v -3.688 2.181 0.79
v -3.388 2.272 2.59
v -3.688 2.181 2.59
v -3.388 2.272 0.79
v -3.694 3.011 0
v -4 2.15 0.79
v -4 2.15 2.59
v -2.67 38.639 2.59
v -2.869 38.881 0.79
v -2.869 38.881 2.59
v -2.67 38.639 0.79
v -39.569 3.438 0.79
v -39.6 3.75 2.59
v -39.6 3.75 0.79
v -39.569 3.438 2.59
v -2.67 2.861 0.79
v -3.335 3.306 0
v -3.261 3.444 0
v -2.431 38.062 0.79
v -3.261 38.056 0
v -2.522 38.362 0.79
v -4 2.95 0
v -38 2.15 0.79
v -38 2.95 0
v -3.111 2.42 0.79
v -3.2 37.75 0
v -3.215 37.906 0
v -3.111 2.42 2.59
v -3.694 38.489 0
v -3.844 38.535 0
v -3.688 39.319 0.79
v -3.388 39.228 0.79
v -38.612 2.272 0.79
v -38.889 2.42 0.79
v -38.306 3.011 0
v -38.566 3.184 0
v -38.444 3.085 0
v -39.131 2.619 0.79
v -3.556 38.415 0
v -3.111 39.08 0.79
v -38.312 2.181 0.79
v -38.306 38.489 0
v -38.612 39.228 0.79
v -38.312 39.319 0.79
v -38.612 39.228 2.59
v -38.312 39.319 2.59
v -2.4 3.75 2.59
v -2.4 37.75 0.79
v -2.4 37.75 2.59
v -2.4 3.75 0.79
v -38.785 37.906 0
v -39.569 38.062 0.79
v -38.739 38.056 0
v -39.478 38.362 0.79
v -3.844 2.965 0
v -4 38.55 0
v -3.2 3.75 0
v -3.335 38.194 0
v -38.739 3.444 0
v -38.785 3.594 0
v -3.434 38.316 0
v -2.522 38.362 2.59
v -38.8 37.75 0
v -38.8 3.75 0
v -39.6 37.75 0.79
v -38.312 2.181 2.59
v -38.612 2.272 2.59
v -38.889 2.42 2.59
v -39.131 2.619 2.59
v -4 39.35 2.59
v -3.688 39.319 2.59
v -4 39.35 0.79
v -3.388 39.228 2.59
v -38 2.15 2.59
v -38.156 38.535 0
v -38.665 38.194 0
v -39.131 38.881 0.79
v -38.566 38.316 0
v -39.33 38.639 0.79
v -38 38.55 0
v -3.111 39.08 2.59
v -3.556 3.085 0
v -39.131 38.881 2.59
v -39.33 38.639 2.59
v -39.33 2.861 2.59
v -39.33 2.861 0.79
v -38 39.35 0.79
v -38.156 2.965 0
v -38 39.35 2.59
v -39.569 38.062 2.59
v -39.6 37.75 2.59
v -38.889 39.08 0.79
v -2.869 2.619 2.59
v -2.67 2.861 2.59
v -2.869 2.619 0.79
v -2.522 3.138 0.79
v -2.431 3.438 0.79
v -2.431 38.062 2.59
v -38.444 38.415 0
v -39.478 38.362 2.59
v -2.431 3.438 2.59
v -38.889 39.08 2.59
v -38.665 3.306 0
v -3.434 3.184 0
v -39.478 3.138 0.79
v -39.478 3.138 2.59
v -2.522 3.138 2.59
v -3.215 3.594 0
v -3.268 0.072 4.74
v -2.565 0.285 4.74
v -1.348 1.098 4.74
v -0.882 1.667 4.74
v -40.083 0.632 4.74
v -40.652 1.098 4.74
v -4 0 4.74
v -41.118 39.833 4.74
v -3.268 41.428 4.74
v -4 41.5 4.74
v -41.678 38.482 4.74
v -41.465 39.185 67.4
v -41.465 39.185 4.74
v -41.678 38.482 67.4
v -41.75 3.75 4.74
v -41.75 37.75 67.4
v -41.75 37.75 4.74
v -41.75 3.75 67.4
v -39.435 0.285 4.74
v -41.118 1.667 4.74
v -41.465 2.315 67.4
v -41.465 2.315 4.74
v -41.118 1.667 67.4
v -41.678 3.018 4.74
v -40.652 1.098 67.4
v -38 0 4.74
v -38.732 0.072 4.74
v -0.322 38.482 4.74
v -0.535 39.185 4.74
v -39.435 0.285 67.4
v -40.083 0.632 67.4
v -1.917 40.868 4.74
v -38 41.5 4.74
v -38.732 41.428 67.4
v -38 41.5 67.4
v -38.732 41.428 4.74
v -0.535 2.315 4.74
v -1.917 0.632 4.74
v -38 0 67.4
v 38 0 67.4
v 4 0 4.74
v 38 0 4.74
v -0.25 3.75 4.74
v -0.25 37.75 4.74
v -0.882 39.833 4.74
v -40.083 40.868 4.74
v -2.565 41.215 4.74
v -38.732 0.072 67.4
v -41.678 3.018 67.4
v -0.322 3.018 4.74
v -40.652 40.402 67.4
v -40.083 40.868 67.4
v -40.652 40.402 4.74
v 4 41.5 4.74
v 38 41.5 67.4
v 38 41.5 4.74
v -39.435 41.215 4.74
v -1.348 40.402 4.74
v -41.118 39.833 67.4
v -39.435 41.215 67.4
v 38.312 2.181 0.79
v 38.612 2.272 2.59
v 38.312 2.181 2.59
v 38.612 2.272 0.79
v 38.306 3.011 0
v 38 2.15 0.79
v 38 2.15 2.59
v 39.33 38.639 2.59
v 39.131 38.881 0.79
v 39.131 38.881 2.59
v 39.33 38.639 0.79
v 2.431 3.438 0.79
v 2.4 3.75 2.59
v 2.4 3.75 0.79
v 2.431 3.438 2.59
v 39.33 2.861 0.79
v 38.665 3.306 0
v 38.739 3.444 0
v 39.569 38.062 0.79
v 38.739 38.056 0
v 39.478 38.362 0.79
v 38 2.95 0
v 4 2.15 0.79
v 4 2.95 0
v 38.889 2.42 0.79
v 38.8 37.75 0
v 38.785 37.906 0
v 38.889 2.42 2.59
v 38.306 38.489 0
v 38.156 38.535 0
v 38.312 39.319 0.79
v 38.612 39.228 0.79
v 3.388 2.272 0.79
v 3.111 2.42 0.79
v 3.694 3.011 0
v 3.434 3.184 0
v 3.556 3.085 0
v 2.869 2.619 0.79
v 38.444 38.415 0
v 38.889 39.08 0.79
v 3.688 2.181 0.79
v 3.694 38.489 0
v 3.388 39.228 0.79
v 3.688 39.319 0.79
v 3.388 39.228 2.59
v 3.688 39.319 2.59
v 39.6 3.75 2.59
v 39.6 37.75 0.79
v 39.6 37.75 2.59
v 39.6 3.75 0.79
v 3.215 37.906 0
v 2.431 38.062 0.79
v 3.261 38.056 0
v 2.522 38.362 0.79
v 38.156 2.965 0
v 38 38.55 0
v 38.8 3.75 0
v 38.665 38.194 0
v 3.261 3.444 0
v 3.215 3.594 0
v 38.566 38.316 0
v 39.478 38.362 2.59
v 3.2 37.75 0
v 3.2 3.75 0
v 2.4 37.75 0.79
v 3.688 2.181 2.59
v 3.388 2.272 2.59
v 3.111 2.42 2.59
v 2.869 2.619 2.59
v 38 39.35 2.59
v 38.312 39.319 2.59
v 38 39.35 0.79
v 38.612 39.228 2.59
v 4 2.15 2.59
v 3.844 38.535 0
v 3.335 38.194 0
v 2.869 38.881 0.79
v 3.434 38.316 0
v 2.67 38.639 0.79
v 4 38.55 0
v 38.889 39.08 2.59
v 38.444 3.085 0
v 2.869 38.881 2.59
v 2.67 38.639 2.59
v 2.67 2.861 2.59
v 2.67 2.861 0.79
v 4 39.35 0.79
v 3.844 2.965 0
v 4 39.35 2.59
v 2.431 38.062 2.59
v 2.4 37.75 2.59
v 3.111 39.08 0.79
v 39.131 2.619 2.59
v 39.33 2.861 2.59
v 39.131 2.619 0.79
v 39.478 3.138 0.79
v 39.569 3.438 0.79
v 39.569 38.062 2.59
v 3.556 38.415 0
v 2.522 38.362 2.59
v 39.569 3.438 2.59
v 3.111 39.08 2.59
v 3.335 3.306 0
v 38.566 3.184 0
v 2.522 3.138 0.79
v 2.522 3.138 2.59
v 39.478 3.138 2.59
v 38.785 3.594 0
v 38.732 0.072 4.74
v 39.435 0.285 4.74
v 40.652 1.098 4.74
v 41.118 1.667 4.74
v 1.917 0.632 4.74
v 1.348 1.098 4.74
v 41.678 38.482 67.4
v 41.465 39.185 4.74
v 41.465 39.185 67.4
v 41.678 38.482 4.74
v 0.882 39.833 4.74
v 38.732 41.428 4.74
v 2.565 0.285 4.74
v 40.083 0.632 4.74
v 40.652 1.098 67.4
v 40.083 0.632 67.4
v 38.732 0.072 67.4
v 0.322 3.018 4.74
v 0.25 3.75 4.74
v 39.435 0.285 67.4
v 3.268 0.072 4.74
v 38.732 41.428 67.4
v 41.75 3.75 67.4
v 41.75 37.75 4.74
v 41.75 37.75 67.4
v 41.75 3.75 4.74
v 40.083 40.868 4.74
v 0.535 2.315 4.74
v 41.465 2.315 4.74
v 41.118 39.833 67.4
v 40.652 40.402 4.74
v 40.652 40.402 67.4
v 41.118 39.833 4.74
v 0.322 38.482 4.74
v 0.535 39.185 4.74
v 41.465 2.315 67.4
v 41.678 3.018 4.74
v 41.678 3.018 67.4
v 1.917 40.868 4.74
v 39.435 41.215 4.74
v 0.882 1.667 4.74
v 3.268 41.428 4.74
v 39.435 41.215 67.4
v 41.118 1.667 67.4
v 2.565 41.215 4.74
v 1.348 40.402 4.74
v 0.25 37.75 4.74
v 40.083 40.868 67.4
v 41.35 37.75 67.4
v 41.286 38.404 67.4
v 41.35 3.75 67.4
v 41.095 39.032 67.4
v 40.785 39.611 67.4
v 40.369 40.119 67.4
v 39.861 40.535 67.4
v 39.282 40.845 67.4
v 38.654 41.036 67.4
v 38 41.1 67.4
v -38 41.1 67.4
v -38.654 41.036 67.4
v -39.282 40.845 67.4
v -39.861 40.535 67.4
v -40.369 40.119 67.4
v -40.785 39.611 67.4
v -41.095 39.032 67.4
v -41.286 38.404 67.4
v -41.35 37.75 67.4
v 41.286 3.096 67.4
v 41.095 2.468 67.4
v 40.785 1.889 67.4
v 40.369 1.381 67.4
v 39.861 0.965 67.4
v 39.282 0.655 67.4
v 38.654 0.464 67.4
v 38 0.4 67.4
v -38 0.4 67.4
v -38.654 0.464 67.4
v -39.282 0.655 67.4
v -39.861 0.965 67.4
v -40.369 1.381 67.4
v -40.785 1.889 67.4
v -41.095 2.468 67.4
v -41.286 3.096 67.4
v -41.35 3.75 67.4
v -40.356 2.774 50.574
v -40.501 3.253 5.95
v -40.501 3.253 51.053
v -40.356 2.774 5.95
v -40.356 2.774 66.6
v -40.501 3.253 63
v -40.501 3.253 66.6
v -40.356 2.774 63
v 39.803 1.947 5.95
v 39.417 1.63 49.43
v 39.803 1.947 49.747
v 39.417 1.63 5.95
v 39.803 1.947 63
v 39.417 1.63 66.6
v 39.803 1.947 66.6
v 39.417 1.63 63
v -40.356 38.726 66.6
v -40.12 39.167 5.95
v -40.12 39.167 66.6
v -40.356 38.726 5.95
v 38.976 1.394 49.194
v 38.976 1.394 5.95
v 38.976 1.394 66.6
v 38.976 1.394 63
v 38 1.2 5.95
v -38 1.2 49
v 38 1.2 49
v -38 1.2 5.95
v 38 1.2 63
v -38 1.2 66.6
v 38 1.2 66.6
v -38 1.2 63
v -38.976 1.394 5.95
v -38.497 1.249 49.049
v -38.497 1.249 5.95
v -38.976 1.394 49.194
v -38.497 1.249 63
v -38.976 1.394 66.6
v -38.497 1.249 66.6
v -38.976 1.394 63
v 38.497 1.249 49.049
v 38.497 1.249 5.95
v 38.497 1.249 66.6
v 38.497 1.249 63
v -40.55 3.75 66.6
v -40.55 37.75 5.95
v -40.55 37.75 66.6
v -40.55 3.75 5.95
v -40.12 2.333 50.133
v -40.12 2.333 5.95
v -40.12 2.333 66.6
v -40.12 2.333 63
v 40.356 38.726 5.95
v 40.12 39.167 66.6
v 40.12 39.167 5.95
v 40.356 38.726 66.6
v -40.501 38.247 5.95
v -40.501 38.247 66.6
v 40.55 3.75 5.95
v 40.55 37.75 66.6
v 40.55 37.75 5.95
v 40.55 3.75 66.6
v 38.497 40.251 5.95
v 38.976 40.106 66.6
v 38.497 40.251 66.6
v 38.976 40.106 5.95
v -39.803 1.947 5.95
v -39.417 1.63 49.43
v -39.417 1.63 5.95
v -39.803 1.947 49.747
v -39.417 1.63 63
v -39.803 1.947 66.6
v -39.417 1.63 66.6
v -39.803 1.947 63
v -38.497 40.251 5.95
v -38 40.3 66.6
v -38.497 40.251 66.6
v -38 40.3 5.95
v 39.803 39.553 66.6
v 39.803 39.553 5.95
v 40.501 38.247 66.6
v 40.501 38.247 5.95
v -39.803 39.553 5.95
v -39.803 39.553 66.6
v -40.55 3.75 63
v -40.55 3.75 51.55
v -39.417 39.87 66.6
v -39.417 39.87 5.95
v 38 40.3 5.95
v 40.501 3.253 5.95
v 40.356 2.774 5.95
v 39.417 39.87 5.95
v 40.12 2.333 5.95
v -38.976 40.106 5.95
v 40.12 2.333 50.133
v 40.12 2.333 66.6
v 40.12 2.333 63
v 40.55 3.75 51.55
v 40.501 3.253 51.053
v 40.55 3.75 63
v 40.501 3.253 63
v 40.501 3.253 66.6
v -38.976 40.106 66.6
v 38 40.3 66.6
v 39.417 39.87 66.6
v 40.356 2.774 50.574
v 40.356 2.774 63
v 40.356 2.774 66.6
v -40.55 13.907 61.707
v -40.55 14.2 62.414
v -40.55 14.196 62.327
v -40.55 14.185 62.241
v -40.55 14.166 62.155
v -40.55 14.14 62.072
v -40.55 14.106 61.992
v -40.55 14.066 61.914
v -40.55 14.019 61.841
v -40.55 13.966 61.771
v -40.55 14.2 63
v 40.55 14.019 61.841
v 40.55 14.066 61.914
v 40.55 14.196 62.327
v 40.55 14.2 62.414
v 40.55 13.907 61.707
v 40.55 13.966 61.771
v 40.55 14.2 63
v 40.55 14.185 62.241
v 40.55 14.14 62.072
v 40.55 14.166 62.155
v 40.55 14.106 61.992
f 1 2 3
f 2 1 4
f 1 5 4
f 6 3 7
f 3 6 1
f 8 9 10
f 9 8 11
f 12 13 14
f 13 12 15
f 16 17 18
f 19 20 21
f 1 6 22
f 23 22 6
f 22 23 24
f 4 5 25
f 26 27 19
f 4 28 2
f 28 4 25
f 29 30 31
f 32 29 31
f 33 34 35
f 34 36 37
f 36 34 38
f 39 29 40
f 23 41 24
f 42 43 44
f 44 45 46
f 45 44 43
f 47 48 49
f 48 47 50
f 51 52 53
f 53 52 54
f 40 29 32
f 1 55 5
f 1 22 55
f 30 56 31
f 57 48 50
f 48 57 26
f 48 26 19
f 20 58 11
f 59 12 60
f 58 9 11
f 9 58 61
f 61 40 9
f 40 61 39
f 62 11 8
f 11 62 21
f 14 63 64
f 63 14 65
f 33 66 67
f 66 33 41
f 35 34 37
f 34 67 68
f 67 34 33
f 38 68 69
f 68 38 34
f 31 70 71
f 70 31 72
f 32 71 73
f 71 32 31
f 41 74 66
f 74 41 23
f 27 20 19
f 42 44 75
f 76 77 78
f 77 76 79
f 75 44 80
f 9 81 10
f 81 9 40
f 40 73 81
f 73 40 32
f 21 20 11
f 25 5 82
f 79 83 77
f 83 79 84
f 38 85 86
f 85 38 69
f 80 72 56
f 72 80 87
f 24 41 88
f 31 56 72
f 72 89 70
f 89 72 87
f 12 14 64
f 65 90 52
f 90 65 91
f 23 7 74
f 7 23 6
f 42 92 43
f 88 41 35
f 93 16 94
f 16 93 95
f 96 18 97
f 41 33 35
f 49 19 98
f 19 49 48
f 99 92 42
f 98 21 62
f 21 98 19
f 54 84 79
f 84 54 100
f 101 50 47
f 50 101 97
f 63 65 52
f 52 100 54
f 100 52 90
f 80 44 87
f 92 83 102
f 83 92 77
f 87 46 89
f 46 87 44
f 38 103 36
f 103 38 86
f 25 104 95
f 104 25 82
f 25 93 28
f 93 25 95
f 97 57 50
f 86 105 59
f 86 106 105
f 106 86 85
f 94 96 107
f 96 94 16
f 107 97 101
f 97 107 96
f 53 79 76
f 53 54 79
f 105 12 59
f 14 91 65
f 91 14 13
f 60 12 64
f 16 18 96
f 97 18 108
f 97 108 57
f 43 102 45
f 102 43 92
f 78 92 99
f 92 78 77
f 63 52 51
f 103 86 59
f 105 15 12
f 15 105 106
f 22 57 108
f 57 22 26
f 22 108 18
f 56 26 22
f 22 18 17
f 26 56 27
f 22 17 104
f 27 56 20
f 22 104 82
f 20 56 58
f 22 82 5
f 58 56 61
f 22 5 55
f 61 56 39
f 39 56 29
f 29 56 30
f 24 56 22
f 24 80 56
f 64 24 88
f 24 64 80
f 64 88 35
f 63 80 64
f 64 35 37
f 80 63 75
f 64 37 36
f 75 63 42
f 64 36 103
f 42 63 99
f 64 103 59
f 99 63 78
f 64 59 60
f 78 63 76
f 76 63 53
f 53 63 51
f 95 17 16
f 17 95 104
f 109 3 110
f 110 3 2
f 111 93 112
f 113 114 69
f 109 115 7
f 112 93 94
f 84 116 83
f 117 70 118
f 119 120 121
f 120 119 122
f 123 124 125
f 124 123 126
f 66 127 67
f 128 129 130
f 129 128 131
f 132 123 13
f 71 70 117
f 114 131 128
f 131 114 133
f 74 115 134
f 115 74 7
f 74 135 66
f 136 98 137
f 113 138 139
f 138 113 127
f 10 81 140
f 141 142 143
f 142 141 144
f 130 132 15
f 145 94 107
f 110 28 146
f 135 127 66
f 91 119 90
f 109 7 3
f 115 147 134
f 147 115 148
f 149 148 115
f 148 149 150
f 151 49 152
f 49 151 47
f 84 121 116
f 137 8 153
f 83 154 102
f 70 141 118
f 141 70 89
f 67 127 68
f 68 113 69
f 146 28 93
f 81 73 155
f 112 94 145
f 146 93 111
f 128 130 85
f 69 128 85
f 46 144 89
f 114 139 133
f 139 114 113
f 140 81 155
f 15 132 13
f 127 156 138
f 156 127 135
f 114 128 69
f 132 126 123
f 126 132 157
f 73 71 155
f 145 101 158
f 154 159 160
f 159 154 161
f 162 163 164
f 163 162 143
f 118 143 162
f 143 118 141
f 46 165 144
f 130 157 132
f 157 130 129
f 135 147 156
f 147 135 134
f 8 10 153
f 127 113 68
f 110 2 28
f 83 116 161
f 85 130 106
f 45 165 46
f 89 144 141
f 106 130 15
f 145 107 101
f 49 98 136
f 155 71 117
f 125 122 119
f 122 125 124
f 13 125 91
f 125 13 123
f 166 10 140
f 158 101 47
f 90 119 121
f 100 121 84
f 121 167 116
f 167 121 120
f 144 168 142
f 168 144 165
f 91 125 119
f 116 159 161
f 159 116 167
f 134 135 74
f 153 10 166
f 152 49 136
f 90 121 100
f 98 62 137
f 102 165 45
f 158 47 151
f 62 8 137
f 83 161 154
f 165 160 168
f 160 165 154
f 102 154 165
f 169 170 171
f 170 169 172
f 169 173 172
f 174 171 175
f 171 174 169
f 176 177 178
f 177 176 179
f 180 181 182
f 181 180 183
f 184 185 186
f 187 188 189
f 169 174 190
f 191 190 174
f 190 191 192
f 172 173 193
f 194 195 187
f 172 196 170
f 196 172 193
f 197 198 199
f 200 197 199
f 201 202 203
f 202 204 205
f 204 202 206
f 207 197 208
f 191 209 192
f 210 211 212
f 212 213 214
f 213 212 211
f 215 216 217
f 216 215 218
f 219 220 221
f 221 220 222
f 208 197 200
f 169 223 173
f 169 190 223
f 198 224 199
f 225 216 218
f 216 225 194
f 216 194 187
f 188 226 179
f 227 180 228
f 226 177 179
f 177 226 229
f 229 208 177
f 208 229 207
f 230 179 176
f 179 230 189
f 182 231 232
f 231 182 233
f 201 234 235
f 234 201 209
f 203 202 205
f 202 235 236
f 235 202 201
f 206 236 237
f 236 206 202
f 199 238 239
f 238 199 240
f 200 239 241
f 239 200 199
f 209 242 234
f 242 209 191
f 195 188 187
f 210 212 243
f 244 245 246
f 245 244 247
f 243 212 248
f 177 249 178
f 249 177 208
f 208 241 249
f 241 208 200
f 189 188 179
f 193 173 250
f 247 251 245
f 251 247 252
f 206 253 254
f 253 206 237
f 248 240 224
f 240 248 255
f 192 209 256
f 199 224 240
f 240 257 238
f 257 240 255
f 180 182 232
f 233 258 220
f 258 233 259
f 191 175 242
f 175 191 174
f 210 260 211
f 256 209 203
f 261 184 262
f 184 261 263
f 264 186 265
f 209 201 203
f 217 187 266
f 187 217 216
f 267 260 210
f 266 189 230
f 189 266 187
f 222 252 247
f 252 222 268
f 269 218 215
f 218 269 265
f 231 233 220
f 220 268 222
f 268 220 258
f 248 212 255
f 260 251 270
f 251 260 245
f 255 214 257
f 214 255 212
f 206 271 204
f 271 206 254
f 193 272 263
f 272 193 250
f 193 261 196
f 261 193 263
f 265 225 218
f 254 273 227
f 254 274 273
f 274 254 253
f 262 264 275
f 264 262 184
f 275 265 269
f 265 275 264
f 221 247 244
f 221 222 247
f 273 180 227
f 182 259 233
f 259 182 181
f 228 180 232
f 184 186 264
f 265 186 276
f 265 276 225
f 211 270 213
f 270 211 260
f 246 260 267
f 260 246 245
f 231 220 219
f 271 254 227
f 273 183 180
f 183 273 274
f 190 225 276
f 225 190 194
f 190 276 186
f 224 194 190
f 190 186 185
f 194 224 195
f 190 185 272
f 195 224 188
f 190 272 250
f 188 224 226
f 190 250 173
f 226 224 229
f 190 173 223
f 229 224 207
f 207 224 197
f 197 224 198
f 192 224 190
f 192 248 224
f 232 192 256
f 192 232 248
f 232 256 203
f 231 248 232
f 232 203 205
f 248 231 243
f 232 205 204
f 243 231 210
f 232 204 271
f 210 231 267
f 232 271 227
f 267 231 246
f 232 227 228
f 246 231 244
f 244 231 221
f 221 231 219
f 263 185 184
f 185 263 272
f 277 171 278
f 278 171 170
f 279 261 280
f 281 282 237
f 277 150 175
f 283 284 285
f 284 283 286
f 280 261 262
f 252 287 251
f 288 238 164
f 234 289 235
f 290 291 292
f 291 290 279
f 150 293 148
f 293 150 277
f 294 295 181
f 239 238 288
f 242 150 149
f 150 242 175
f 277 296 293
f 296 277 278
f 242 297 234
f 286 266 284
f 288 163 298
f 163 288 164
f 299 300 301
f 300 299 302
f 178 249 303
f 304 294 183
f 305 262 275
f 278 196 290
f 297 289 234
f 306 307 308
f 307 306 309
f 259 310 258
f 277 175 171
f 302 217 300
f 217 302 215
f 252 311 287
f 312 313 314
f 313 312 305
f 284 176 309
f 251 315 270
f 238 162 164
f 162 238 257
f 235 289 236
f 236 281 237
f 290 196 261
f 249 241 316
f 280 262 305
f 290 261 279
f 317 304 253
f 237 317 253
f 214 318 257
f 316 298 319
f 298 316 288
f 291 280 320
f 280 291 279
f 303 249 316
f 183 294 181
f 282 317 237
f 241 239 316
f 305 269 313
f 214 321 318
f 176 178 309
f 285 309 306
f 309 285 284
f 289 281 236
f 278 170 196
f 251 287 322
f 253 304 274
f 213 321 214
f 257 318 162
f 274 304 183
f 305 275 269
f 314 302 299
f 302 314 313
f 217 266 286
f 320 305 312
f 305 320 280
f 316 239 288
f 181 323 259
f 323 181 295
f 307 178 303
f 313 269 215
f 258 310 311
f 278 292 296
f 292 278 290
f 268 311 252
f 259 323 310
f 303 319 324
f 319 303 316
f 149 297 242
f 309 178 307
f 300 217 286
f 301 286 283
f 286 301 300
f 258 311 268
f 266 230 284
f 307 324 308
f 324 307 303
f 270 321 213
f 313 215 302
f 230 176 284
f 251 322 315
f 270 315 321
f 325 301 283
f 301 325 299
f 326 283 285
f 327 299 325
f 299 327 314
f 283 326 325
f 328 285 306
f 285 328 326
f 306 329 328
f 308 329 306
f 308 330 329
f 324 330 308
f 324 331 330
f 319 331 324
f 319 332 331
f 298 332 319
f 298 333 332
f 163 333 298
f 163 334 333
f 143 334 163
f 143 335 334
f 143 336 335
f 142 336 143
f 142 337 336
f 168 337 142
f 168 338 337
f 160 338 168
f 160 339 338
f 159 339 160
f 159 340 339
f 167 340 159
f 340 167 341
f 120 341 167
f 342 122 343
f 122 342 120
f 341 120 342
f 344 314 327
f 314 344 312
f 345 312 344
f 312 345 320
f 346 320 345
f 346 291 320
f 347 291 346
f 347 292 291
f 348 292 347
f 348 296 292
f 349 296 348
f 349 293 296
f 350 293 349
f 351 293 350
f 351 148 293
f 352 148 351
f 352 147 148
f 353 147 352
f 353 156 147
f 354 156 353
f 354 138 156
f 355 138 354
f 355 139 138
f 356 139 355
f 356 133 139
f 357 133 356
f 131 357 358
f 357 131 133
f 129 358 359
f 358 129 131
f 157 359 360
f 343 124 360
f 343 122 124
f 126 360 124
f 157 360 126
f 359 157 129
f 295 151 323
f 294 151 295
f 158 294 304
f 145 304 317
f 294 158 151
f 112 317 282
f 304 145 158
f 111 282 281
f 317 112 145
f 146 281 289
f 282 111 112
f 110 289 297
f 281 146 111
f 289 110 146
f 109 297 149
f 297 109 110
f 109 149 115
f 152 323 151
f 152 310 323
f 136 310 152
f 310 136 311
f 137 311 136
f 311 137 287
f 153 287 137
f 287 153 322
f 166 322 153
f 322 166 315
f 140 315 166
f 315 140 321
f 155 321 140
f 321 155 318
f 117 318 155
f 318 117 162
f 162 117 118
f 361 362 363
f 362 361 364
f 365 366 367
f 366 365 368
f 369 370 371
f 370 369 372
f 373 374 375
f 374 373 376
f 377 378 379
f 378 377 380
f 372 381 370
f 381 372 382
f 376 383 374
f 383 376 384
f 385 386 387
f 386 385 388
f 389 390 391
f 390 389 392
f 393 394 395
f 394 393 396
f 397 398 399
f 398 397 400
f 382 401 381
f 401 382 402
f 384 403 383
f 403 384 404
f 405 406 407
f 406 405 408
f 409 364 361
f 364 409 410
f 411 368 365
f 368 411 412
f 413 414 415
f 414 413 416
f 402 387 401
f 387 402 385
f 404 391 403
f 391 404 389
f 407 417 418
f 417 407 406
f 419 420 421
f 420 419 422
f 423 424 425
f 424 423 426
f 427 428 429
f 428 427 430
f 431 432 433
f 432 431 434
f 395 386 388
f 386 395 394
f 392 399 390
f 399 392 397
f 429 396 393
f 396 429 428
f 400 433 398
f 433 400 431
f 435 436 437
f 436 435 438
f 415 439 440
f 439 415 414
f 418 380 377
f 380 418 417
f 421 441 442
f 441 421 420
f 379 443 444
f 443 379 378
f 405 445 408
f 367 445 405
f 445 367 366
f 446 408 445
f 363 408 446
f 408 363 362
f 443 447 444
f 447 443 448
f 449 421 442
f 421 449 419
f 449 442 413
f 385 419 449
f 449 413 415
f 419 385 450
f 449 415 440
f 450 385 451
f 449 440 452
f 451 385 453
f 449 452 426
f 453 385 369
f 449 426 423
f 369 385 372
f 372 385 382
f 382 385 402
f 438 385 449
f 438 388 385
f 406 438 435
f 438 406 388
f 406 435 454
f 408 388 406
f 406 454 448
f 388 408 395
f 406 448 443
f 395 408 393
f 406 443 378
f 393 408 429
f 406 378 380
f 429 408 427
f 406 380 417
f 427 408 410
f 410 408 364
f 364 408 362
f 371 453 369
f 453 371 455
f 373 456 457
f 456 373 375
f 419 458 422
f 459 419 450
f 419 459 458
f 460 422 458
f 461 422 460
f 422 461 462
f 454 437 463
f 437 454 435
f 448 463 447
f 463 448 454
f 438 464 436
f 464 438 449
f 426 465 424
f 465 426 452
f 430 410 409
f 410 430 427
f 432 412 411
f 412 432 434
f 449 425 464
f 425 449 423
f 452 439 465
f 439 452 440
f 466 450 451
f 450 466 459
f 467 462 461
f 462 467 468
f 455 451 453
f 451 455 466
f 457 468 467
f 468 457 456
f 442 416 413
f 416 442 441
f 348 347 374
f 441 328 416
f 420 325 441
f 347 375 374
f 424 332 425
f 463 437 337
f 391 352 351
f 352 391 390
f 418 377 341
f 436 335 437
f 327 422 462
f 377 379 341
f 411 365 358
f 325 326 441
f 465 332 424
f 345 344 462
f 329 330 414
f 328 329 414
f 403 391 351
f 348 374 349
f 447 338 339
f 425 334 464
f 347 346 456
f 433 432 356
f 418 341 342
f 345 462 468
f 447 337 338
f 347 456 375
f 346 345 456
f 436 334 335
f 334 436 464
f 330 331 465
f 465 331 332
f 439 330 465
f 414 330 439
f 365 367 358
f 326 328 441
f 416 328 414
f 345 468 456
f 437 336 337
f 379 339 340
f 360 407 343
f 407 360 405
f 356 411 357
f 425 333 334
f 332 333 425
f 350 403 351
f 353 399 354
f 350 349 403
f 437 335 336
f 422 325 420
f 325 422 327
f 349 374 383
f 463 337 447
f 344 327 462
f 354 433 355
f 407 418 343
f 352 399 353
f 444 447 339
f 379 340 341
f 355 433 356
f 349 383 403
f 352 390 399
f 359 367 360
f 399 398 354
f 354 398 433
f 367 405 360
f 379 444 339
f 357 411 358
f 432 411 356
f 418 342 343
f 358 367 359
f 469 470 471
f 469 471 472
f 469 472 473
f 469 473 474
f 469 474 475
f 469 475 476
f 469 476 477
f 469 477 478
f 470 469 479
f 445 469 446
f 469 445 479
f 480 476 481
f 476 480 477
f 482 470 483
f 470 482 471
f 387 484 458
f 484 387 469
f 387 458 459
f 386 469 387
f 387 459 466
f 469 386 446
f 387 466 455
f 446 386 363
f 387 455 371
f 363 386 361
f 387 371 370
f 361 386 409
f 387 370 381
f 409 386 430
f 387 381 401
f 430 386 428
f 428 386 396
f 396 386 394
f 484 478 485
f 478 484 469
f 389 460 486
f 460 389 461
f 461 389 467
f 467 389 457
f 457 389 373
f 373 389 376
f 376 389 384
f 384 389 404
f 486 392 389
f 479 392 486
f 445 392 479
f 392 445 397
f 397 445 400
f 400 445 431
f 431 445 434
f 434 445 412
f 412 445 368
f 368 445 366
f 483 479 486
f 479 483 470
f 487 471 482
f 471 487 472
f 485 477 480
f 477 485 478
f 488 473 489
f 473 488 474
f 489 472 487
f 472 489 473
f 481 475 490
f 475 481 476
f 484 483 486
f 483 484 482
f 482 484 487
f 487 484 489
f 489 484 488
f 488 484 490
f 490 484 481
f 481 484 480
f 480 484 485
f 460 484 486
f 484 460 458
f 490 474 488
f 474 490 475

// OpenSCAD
// file: ../../../modules/gridfinity.scad
// Gridfinity ベースプレートの共有 module。
// 寸法は Gridfinity 仕様 (Zack Freedman) の baseplate 輪郭に従う:
//   ピッチ 42、ソケット上端開口 41.5 (角 R4)、上から 45° 面取り 2.15 →
//   垂直 1.8 (37.2 角・R1.85) → 45° 面取り 0.7 → 底 35.8 角 (R1.15)。
//   ソケット深さ = 2.15 + 1.8 + 0.7 = 4.65。
//
// 座標系: X が列方向 (中央が 0)、Y が行方向 (板の前端が 0)、Z=0 が板の底面。
// 板の外形は grid とは独立に rim で与えるので、grid より大きい板 (縁付き) を
// 作れる。ソケットは rim=[left, right, front, back] の内側へ 42 ピッチで並ぶ。

gf_pitch = 42;
gf_socket_top = 41.5; // 上端開口
gf_socket_mid = 37.2; // 垂直部
gf_socket_bot = 35.8; // 底
gf_socket_r_top = 4;
gf_socket_r_mid = 1.85;
gf_socket_r_bot = 1.15;
gf_chamfer_top = 2.15;
gf_wall_h = 1.8;
gf_chamfer_bot = 0.7;
gf_socket_depth = gf_chamfer_top + gf_wall_h + gf_chamfer_bot; // 4.65
gf_fn = 32;
gf_eps = 0.01; // hull 用の薄板の厚さ
gf_over = 0.5; // 切削の抜き代

// 角丸正方形または矩形 (w は一辺、または [幅, 奥行き]、角 R)
module
gf_rounded_square(w, r)
{
    offset(r = r, $fn = gf_fn)
        square(is_list(w) ? w - [ 2 * r, 2 * r ] : w - 2 * r, center = true);
}

// 厚さ gf_eps の角丸正方形の薄板を z に置く (hull の骨)
module
gf_slab(w, r, z)
{
    translate([ 0, 0, z ]) linear_extrude(gf_eps) gf_rounded_square(w, r);
}

// ソケット1個の切削体。z=0 がソケットの底 (床の天面)、+Z へ 4.65 で天面に出る。
// clearance は嵌合の逃げで、輪郭を全周へ clearance だけ外へ出す (幅 +2c、角 R
// +c)。pitch_x は X 方向のセル幅。端数でも角 R と面取りの寸法を保つ。
module
gf_socket_cut(clearance = 0, pitch_x = gf_pitch)
{
    z1 = gf_chamfer_bot;
    z2 = z1 + gf_wall_h;
    z3 = gf_socket_depth;
    c = clearance;
    assert(pitch_x > gf_pitch - gf_socket_top + 2 * gf_socket_r_top,
           "Cell width is too small for the socket corner radius");
    delta = [ pitch_x - gf_pitch, 0 ];
    bot = [ gf_socket_bot + 2 * c, gf_socket_bot + 2 * c ] + delta;
    mid = [ gf_socket_mid + 2 * c, gf_socket_mid + 2 * c ] + delta;
    top = [ gf_socket_top + 2 * c, gf_socket_top + 2 * c ] + delta;
    hull()
    {
        gf_slab(bot, gf_socket_r_bot + c, 0);
        gf_slab(mid, gf_socket_r_mid + c, z1 - gf_eps);
    }
    hull()
    {
        gf_slab(mid, gf_socket_r_mid + c, z1 - gf_eps);
        gf_slab(mid, gf_socket_r_mid + c, z2 - gf_eps);
    }
    hull()
    {
        gf_slab(mid, gf_socket_r_mid + c, z2 - gf_eps);
        gf_slab(top, gf_socket_r_top + c, z3 - gf_eps);
    }
    // 天面より上へ抜く (天面と同一平面の退化した面を残さない)
    gf_slab(top, gf_socket_r_top + c, z3 - gf_eps);
    translate([ 0, 0, z3 - gf_eps ]) linear_extrude(gf_over + gf_eps)
        gf_rounded_square(top, gf_socket_r_top + c);
}

// ベースプレート。cols x rows のソケットを床 floor_t の上に彫る。
// rim = [left, right, front, back] はソケット列の外側に残す縁の幅。
// 板の幅 = cols*42 + left + right、奥行き = rows*42 + front + back。
// cols の端数は左端の細幅セルになる。rows は正の整数。
// clearance はソケットの嵌合の逃げ (gf_socket_cut を参照)。
module
gf_baseplate(cols, rows, rim = [ 0, 0, 0, 0 ], floor_t = 1, clearance = 0)
{
    grid_w = cols * gf_pitch;
    grid_d = rows * gf_pitch;
    plate_w = grid_w + rim[0] + rim[1];
    plate_d = grid_d + rim[2] + rim[3];
    x0 = -plate_w / 2 + rim[0]; // ソケット列の左端
    first_pitch = grid_w - (ceil(cols) - 1) * gf_pitch;
    difference()
    {
        translate([ -plate_w / 2, 0, 0 ])
            cube([ plate_w, plate_d, floor_t + gf_socket_depth ]);
        for (c = [0:ceil(cols) - 1], r = [0:rows - 1])
            translate([
                x0 + (c == 0 ? first_pitch / 2
                             : first_pitch + (c - 0.5) * gf_pitch),
                rim[2] + (r + 0.5) * gf_pitch,
                floor_t
            ]) gf_socket_cut(clearance, c == 0 ? first_pitch : gf_pitch);
    }
}
// file: ../../../modules/gridfinity_bins.scad
include <gridfinity_bin.scad>

// assets/gridfinity-bin/ の bin 群の共通値と、サイズ 3 引数の払い出し口。
// 単体では何も描かない。設計の経緯と確定値は
// ledger/designs/gridfinity-bin-4u.md が正本。
// 通常binは4U/9U、X={1,1.5,2,2.5,3} × Y={1,2,3,4,5,5.5}。
// 両軸に端数を持つ組み合わせはassetに置かない（各高さ28種）。
// Xが横、Yがラベルの壁から奥、unitsが高さ（7mm単位）。
wall = 1.2;    // 0.4 ノズル 3 本
floor_t = 1.2; // 底 (4.75) の上に載せる床。床の天面 z = 5.95
label_d = 13;  // 12mm 幅のラベルシールを貼る天板の張り出し
label_t = 1; // 天板の厚さ (user 指定)。下は 45° の無垢のくさび
label_r = 1; // 天板の先端と 45° 面の境目の R (user 指定)
// カードケース (goods/card_case_2x3x4u.scad) の値。カードは ISO/IEC 7810 ID-1 (85.6 × 54 ×
// 0.76、隅 R3) で、長辺を Y (rows 方向) に寝かせ、X 中央・手前の壁から 10 奥に置く。ポケットは
// カードより 1 大きい (片側 0.5)。右奥のマスは壁の内面まで抜き、床と底を外形に平行な 45° の窪みにする。
// ポケットの左右の埋めの天面 (幅 13.05) が 12mm のラベルを貼る帯。ポケットと穴の交点の
// 縦エッジは丸める (開口の上縁は丸めない: 壁を上端まで垂直に保ち、収まる枚数を減らさない)
card_w = 54;    // カードの短辺 (X)。user 指定「高さ 54」
card_d = 85.6;  // カードの長辺 (Y)。user 指定「幅 85.6」
card_clear = 1; // ポケットの余裕 (user 指定「+1mm」)
// ポケットの手前の辺の、手前の壁の内面からの距離 (user 指定「10mm」)
card_off = 10;
// ポケットの平面の隅 R (user 指定「角の丸み 3mm」。ID-1 の隅は 2.88..3.48)
card_r = 3;
// ポケットと穴が交わる所の、埋めの凸の縦エッジの R (指の当たる角)
card_edge_r = 2;
recess_skin = floor_t + 1.75; // 窪みの床 z (底の皮)。user 指定「壁厚と同じ 1.2 は過剰、1.75 返す」

function bin_contract(cols, rows, units) = str("CONTRACT units=",
                                               units,
                                               " pitch=",
                                               gf_pitch,
                                               " outer=",
                                               gfb_outer,
                                               " h=",
                                               units* gfb_unit,
                                               " lip=",
                                               gfb_lip_h,
                                               " base=",
                                               gfb_base_bot,
                                               "/",
                                               gfb_base_mid,
                                               "/",
                                               gfb_outer,
                                               " base_h=",
                                               gfb_base_h,
                                               " wall=",
                                               wall,
                                               " floor_top=",
                                               gfb_base_h + floor_t,
                                               " label=",
                                               label_d,
                                               "x",
                                               label_t,
                                               " wedge=45 fillet=",
                                               label_r,
                                               " bin=",
                                               cols,
                                               "x",
                                               rows,
                                               " size=",
                                               cols* gf_pitch - 0.5,
                                               "x",
                                               rows* gf_pitch - 0.5);

// (cols, rows, units) でラベル付き bin を払い出す。例: gridfinity_bin(2, 4, 4)
module
gridfinity_bin(cols, rows, units = 4)
{
    echo(bin_contract(cols, rows, units));
    gfb_bin(cols, rows, units, wall, floor_t, label_d, label_t, label_r);
}

function card_contract(cols, rows, units) = str("CONTRACT card units=",
                                                units,
                                                " bin=",
                                                cols,
                                                "x",
                                                rows,
                                                " size=",
                                                cols* gf_pitch - 0.5,
                                                "x",
                                                rows* gf_pitch - 0.5,
                                                " h=",
                                                units* gfb_unit,
                                                " lip=",
                                                gfb_lip_h,
                                                " floor_top=",
                                                gfb_base_h + floor_t,
                                                " card=",
                                                card_w,
                                                "x",
                                                card_d,
                                                " pocket=",
                                                card_w + card_clear,
                                                "x",
                                                card_d + card_clear,
                                                " at=",
                                                -(card_w + card_clear) / 2,
                                                ",",
                                                wall + card_off,
                                                " hole=",
                                                (cols - 1) / 2 * gf_pitch - gfb_outer / 2,
                                                ",",
                                                (rows - 0.5) * gf_pitch - 0.25 - gfb_outer / 2,
                                                " hole_r=",
                                                gfb_outer_r - wall,
                                                " recess=",
                                                gfb_outer - 2 * wall,
                                                "/",
                                                gfb_base_mid - 2 * wall,
                                                " recess_floor=",
                                                recess_skin,
                                                " r=",
                                                card_r,
                                                " edge_r=",
                                                card_edge_r);

// (cols, rows, units) でカードケースを払い出す。例: gridfinity_card_case(2, 3, 4)
module
gridfinity_card_case(cols, rows, units = 4)
{
    echo(card_contract(cols, rows, units));
    gfb_card_case(cols,
                  rows,
                  units,
                  wall,
                  floor_t,
                  [ card_w, card_d ],
                  card_clear,
                  card_off,
                  card_r,
                  recess_skin,
                  card_edge_r);
}
// main file
include <../../../modules/gridfinity_bins.scad>

gridfinity_bin(2, 1, 9);
